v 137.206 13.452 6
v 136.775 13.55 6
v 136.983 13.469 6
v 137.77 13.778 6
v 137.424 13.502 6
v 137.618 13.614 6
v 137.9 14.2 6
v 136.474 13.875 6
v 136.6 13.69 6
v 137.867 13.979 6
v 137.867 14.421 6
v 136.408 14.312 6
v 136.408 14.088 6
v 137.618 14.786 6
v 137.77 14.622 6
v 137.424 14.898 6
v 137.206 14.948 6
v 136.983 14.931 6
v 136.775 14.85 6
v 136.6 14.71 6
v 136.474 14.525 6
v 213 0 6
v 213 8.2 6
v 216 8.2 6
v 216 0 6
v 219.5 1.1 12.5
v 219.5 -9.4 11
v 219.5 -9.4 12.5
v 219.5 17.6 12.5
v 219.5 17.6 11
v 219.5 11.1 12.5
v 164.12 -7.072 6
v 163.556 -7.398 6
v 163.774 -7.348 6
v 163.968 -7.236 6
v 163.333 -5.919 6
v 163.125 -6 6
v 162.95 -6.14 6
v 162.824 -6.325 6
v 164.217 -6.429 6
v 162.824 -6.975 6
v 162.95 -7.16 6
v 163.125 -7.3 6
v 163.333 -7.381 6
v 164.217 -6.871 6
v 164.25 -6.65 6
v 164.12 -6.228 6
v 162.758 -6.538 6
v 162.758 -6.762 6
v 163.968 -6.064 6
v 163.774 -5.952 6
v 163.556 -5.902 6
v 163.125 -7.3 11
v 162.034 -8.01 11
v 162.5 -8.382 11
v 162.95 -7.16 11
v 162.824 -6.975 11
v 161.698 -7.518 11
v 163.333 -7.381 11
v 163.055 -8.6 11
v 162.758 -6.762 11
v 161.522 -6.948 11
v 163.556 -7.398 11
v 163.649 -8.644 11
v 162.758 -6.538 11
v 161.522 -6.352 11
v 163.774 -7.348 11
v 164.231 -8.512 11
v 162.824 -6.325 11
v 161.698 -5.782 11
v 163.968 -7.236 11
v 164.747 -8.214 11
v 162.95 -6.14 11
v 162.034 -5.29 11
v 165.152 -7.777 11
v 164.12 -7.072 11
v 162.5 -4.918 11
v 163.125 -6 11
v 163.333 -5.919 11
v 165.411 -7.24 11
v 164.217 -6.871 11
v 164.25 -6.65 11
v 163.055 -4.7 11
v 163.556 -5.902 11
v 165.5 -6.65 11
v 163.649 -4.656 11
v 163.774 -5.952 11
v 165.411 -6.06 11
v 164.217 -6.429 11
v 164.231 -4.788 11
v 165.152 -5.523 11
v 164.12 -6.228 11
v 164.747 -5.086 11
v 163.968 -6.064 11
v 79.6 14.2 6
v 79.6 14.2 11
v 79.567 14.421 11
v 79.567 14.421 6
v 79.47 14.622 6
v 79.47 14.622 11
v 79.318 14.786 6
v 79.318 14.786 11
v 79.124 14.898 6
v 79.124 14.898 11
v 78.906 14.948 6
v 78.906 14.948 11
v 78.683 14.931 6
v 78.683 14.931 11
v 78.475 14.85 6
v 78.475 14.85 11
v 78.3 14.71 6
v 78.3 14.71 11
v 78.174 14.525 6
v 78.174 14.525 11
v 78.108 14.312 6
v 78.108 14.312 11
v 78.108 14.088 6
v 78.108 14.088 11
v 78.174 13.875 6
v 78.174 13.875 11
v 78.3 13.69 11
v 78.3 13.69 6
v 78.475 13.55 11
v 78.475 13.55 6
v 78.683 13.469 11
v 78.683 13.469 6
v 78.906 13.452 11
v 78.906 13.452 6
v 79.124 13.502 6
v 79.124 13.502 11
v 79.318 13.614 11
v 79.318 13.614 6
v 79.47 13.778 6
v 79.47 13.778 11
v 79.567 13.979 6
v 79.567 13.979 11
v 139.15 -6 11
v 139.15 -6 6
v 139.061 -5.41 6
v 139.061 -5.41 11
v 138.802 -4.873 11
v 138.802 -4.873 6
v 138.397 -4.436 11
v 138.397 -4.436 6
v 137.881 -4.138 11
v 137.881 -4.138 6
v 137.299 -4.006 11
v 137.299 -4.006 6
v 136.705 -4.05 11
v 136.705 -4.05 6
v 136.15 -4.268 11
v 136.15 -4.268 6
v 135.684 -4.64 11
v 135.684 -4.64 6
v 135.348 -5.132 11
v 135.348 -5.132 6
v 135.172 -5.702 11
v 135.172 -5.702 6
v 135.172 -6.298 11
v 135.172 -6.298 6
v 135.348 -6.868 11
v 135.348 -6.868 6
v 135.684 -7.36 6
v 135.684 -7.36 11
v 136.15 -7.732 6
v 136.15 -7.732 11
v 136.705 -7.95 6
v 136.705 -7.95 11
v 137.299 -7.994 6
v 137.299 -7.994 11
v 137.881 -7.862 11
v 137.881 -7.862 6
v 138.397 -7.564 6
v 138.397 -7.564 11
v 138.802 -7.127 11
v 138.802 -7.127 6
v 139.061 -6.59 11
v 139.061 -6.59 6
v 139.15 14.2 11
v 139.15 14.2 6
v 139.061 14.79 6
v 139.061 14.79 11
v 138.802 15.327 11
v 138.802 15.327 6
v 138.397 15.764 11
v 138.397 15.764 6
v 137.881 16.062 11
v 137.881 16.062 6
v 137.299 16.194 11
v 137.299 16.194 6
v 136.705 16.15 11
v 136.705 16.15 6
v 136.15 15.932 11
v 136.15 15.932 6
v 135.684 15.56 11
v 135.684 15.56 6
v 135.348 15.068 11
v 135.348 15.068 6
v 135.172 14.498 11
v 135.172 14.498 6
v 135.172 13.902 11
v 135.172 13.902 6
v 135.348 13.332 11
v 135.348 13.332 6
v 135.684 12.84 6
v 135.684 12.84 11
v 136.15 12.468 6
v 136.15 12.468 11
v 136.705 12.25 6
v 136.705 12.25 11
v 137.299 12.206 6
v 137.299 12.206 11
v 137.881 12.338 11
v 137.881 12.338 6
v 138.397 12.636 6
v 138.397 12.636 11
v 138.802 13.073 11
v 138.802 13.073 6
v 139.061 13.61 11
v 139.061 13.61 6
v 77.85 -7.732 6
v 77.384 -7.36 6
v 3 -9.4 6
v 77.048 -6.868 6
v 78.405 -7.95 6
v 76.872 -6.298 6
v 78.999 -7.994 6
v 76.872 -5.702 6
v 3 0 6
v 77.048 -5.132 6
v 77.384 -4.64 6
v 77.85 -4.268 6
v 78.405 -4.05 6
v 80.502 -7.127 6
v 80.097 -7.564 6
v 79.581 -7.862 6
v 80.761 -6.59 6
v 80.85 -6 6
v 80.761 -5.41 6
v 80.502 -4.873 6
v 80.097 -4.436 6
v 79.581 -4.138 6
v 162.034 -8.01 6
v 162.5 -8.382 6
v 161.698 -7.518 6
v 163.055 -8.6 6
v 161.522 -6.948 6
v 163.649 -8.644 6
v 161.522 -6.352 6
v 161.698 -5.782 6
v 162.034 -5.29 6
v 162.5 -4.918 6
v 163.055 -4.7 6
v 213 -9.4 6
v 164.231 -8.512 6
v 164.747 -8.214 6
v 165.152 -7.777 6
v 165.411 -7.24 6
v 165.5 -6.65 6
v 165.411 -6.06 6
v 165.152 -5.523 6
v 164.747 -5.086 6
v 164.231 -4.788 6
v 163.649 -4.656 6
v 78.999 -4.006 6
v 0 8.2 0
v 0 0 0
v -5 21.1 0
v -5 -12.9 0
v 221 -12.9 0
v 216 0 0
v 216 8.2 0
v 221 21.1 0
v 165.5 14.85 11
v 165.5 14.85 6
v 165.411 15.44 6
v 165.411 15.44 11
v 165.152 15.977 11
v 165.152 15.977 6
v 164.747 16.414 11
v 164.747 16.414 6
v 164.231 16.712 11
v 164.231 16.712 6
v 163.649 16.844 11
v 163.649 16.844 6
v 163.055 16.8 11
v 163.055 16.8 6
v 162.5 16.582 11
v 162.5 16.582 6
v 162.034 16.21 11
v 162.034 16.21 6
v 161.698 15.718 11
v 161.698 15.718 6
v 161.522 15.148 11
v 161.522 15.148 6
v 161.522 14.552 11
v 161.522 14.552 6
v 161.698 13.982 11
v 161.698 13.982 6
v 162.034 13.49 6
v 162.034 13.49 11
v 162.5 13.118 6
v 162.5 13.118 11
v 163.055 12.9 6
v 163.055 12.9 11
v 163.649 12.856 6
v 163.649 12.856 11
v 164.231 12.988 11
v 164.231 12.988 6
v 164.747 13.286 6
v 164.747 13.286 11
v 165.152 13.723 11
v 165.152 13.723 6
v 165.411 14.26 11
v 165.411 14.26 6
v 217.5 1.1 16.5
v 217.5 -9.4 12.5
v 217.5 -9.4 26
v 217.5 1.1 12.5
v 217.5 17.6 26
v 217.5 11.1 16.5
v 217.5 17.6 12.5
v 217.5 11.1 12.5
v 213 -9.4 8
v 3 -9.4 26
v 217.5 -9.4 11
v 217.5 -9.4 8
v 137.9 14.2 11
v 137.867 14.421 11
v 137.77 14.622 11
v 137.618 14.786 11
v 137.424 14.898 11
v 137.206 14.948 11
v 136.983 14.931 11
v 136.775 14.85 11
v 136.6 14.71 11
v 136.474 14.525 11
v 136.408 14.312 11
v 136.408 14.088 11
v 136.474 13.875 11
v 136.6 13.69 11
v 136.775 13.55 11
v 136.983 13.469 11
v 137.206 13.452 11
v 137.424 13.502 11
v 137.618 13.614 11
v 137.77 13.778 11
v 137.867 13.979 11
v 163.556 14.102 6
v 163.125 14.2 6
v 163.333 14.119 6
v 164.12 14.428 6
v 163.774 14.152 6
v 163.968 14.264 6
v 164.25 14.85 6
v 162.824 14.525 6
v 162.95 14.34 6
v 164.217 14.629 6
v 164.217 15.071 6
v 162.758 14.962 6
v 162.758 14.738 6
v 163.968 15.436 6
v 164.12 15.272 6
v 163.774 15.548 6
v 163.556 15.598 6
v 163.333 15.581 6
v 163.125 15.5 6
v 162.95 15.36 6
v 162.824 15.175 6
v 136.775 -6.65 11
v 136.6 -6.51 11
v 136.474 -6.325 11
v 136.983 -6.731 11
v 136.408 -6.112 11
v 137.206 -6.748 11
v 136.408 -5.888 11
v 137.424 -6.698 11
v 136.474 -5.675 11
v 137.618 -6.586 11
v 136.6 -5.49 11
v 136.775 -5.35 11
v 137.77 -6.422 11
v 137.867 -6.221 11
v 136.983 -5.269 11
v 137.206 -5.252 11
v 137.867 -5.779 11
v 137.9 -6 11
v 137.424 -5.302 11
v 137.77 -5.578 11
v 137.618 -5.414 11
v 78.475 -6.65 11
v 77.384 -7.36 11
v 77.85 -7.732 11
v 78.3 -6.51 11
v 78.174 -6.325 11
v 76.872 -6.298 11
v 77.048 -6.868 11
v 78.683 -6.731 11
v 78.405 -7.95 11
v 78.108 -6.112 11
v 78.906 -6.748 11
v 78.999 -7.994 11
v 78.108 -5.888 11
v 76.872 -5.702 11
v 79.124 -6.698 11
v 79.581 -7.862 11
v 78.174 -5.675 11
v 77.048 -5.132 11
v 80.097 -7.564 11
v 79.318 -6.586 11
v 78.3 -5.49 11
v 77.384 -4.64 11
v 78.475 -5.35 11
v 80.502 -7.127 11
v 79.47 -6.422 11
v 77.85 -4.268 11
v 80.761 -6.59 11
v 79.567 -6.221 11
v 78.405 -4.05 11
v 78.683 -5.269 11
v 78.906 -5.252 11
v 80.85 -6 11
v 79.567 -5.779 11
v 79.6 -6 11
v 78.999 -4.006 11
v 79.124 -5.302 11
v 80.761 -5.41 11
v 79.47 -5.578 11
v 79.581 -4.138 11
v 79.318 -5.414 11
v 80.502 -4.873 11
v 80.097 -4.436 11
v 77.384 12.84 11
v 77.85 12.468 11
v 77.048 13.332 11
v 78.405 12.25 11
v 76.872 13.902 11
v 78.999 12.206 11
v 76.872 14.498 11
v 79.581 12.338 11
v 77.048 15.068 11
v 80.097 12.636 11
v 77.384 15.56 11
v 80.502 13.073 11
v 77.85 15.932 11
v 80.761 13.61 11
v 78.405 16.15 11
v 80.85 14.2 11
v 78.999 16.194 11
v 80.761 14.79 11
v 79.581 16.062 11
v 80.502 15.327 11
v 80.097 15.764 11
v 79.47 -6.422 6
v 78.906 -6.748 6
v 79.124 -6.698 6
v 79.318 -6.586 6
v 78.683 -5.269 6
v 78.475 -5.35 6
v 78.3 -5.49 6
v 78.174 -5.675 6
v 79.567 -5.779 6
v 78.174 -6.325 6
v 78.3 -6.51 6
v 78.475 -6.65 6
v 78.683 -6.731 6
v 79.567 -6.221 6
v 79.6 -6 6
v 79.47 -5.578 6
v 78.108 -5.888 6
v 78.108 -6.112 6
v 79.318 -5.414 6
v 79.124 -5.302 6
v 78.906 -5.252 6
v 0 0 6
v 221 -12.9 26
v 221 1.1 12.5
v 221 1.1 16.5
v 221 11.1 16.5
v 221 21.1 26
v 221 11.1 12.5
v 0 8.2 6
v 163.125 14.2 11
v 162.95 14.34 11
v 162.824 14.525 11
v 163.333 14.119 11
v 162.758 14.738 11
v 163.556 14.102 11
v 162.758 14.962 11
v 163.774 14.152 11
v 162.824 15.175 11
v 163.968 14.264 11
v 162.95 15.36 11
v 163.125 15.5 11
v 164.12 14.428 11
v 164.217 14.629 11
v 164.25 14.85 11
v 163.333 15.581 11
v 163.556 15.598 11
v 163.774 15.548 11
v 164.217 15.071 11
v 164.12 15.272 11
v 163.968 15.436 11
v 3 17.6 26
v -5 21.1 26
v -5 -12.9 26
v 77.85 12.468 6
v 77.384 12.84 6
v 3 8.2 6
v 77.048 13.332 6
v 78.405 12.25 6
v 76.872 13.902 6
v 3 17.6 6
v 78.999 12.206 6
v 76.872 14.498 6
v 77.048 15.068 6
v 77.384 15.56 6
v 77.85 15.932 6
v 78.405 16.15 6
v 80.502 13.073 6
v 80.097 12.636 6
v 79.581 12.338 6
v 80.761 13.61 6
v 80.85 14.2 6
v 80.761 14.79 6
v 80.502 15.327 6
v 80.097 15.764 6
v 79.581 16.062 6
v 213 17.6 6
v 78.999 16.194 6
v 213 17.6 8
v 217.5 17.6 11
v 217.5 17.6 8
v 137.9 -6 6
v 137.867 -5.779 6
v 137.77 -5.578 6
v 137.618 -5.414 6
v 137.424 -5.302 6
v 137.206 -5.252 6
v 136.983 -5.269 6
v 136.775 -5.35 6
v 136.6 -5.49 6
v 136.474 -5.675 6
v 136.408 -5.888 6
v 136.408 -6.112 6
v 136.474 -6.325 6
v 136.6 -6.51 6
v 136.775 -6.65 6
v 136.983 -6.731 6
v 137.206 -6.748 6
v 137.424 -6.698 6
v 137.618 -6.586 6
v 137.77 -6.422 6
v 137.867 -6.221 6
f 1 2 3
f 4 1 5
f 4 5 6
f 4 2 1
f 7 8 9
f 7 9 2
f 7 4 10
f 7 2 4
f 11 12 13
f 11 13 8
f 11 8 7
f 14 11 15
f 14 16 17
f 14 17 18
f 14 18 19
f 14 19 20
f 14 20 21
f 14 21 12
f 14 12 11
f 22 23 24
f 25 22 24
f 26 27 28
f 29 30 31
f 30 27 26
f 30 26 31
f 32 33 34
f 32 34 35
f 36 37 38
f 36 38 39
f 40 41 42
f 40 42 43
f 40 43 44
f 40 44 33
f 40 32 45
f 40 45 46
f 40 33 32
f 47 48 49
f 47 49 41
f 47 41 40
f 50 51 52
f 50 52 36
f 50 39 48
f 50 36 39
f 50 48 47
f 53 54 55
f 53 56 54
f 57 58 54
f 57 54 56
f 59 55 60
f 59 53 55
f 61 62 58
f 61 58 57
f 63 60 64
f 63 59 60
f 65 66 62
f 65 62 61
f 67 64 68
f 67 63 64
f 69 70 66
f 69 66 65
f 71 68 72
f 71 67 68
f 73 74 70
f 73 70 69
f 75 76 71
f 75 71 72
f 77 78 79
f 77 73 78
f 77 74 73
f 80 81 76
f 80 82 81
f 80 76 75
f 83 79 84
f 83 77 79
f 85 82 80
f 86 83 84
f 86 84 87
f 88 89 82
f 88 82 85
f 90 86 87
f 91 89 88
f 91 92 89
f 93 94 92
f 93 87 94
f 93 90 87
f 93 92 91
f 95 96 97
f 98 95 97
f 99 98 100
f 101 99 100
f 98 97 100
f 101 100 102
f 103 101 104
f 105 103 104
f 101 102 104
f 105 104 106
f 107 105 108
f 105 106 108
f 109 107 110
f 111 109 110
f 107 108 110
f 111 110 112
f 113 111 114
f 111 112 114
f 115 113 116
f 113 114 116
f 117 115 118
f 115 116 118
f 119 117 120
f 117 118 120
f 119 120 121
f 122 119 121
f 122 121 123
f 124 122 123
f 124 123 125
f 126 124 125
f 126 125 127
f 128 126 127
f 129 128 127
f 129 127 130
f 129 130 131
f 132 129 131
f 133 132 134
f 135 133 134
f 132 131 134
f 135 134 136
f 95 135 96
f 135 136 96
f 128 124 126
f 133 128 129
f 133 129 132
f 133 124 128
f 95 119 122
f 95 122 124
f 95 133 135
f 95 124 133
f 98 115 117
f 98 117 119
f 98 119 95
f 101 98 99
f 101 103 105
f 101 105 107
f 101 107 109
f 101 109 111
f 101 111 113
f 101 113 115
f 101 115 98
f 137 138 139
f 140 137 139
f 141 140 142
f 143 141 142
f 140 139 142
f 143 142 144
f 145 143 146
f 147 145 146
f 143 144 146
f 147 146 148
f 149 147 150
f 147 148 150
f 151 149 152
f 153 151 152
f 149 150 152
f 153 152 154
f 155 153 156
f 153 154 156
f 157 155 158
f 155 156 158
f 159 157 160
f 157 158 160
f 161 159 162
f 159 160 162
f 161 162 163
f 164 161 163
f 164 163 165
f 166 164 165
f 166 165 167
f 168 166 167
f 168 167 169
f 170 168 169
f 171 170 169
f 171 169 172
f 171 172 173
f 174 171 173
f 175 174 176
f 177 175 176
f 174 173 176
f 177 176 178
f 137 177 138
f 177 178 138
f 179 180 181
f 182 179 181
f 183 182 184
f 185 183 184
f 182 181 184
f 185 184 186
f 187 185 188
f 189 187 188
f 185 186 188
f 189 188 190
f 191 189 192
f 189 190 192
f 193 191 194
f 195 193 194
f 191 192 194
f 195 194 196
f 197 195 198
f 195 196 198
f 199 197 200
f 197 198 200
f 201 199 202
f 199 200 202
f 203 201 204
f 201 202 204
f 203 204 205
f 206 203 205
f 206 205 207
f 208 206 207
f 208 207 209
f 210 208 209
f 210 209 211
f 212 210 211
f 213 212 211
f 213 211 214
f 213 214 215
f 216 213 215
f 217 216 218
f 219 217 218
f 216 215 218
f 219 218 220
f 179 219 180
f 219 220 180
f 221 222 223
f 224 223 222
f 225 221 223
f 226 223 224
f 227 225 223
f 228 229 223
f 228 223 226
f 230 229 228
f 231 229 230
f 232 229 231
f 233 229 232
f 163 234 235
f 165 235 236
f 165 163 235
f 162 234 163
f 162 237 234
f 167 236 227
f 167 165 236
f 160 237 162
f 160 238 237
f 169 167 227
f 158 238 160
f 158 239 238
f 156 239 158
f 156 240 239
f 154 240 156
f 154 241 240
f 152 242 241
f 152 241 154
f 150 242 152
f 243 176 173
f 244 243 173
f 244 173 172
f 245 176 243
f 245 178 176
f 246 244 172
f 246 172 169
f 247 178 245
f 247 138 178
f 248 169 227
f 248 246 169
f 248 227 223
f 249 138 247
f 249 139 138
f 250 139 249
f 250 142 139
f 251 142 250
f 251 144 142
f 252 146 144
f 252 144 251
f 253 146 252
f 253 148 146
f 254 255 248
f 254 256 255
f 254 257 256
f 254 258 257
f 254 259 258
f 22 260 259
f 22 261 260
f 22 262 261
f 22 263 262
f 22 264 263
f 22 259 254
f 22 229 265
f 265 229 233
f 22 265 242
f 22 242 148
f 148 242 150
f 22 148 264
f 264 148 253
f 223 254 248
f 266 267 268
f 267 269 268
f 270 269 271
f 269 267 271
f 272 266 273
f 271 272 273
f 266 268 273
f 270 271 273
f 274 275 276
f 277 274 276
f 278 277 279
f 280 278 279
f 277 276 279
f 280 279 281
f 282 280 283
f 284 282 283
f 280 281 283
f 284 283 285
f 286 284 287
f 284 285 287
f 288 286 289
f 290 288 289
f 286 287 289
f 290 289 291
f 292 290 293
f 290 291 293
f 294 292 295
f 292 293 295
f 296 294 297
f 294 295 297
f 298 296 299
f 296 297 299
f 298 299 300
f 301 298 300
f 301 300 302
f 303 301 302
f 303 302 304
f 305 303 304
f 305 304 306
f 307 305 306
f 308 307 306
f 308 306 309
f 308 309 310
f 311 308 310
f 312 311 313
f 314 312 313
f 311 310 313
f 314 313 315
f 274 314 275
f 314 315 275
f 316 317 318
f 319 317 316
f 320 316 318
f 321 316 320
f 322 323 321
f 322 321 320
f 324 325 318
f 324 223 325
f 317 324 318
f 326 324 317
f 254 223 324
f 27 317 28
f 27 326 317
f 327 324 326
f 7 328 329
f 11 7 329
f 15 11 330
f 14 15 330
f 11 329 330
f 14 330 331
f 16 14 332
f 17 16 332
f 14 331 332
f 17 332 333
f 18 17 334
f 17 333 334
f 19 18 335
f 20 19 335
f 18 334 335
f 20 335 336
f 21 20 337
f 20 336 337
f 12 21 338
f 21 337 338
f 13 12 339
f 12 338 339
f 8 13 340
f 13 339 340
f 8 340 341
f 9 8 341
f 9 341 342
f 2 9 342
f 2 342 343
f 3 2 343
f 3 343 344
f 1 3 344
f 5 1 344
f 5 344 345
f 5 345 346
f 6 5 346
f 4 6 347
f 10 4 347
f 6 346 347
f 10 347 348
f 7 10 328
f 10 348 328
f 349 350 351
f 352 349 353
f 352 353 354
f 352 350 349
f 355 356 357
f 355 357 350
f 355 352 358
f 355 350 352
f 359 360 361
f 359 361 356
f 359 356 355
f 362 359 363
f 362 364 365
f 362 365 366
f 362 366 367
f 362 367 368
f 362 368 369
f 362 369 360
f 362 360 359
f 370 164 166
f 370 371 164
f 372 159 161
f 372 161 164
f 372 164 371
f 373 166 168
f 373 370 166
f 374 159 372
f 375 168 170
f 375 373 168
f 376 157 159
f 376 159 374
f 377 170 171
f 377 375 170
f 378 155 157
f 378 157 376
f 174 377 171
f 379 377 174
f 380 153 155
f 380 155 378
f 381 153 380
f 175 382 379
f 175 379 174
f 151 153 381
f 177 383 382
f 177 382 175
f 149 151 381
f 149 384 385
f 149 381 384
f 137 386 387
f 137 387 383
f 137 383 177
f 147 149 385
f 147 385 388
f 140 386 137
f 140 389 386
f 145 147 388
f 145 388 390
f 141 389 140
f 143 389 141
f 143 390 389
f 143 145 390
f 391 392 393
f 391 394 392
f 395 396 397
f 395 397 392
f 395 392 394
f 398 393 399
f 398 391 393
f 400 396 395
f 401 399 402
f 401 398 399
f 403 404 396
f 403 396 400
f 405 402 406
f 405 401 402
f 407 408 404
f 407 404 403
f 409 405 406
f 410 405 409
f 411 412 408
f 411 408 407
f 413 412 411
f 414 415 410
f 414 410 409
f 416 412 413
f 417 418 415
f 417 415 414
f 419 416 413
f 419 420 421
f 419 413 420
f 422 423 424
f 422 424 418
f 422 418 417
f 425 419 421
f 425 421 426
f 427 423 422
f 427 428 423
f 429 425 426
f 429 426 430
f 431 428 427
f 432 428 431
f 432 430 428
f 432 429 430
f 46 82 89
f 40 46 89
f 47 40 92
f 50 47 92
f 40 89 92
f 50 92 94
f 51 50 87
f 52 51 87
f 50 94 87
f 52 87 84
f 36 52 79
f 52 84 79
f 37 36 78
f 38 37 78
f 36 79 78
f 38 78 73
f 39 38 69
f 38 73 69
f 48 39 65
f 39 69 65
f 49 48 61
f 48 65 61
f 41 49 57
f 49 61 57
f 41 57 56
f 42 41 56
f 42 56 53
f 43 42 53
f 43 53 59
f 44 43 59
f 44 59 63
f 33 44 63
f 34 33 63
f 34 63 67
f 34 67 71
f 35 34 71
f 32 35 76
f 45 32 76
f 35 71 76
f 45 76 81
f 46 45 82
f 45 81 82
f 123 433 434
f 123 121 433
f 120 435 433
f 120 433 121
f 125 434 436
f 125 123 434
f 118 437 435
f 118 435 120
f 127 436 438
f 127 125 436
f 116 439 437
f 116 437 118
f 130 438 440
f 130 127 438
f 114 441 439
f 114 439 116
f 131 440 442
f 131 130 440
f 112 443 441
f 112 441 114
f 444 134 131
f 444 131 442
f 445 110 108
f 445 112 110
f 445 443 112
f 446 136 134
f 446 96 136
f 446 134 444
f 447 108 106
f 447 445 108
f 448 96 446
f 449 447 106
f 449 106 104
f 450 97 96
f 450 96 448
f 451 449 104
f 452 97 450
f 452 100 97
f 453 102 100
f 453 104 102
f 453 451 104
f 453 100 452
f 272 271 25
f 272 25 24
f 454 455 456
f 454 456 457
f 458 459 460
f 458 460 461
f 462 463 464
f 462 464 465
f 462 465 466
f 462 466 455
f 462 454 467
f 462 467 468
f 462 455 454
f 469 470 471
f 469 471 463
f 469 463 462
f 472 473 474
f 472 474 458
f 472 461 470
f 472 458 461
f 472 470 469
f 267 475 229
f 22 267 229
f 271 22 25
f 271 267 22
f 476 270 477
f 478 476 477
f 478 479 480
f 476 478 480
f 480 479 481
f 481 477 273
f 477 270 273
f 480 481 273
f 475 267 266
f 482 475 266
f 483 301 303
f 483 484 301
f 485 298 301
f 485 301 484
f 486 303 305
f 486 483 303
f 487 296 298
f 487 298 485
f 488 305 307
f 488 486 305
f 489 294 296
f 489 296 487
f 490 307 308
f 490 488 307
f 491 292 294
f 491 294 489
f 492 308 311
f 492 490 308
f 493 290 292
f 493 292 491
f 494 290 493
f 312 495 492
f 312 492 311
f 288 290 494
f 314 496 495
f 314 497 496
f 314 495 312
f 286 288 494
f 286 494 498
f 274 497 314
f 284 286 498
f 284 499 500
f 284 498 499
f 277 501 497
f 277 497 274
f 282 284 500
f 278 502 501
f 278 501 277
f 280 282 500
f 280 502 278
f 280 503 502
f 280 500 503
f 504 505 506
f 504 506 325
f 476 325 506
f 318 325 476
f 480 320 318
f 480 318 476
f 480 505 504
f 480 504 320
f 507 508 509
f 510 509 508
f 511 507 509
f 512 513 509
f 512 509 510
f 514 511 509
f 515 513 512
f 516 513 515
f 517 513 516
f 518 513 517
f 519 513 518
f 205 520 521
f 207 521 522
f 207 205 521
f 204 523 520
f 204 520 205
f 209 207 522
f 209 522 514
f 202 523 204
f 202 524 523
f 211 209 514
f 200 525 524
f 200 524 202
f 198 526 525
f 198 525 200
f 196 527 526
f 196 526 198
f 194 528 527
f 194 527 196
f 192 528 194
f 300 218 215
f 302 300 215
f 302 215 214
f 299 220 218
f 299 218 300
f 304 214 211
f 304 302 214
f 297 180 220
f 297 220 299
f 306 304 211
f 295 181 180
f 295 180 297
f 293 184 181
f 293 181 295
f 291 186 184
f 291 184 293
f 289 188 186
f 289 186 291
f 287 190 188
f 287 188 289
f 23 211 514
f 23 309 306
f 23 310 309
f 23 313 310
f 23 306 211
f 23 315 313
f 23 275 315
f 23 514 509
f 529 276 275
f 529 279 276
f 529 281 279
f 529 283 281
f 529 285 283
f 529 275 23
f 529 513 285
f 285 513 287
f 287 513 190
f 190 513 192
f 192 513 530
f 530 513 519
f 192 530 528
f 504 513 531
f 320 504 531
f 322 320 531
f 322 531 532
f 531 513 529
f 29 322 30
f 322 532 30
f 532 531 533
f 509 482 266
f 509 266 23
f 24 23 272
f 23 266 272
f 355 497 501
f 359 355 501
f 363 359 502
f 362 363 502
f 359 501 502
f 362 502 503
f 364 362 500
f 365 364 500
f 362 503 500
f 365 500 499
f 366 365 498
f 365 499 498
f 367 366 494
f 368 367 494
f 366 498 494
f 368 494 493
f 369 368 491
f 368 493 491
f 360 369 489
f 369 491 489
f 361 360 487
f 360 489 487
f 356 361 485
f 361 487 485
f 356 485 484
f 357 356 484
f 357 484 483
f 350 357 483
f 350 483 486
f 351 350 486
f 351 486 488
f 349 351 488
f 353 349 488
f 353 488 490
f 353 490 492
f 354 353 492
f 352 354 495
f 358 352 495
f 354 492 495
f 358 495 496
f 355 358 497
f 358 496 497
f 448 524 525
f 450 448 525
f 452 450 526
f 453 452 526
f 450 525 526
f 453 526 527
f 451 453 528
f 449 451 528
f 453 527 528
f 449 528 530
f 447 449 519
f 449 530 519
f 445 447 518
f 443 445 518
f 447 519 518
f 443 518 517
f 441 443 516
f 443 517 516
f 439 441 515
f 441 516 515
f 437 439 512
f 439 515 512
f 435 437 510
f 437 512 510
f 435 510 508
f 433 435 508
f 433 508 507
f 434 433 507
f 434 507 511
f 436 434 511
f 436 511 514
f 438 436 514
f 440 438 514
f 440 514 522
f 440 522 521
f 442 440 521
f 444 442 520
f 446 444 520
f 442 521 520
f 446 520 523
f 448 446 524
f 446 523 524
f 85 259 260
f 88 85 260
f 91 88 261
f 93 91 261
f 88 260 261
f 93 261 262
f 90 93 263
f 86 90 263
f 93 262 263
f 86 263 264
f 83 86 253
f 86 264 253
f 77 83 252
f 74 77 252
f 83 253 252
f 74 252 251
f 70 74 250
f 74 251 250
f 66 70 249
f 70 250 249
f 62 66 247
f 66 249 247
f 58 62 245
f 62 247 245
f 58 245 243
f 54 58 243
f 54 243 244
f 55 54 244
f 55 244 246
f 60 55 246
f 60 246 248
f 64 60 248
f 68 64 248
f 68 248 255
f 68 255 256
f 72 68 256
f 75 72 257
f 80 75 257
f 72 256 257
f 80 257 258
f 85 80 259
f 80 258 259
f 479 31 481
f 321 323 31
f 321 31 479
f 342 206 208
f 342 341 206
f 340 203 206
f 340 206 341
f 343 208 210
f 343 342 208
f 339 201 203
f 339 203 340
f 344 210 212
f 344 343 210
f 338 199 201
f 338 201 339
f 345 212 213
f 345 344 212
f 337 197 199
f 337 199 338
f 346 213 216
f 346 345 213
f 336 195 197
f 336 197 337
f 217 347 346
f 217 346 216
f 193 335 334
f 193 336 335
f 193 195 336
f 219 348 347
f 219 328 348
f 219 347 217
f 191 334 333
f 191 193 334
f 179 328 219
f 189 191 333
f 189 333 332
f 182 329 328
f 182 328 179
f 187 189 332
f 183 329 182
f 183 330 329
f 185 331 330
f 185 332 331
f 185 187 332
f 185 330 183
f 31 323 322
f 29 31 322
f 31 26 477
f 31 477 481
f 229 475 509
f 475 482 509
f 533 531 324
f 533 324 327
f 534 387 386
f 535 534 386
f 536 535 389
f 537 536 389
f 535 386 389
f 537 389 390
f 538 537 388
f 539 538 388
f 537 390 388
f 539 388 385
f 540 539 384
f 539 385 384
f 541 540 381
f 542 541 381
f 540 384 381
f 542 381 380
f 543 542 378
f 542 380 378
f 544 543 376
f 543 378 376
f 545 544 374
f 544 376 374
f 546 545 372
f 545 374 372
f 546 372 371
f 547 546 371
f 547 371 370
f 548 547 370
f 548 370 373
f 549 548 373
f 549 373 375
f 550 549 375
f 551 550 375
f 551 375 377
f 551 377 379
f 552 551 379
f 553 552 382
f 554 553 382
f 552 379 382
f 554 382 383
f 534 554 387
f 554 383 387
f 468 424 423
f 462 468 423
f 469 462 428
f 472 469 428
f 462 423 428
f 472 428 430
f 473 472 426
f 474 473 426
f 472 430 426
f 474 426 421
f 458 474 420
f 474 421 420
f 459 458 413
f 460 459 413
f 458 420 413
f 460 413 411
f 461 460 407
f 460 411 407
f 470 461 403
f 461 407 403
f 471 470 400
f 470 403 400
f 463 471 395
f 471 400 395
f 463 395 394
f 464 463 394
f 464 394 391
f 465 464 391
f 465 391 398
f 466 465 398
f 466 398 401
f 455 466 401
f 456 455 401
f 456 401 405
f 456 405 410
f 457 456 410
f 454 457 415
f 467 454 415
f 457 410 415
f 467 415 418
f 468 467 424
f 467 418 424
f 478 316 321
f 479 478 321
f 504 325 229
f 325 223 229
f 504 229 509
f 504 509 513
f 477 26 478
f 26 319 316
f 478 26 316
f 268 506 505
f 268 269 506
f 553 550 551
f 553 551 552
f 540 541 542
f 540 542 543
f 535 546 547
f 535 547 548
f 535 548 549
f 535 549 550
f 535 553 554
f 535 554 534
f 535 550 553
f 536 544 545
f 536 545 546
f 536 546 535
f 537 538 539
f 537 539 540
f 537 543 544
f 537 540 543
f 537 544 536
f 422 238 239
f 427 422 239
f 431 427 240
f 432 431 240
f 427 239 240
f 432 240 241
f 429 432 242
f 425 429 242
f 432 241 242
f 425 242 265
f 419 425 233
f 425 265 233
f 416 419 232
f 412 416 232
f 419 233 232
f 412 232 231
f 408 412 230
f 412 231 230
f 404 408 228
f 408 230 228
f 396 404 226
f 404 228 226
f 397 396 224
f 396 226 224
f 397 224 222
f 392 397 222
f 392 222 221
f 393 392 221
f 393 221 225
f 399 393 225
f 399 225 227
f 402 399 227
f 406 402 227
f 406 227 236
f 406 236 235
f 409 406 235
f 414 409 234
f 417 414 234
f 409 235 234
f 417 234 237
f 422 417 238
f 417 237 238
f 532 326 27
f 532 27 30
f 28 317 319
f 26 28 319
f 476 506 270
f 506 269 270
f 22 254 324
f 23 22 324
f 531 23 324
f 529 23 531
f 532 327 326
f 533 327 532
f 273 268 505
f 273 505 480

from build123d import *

# Parameters (mm, degrees)
SKETCH_1_W          = 226
SKETCH_1_H          = 34
SKETCH_1_W_2        = 216
SKETCH_1_H_2        = 8.2
EXTRUDE_1_DEPTH     = 6
SKETCH_2_R          = 2
EXTRUDE_2_DEPTH     = 5
SKETCH_3_R          = 0.75
CUT_EXTRUDE_1_DEPTH = 5
SKETCH_4_W          = 226
SKETCH_4_H          = 34
SKETCH_4_W_2        = 210
SKETCH_4_H_2        = 27
EXTRUDE_3_DEPTH     = 2
SKETCH_6_W          = 226
SKETCH_6_H          = 34
SKETCH_6_W_2        = 214.5
SKETCH_6_H_2        = 27
EXTRUDE_4_DEPTH     = 18
SKETCH_7_W          = 1.5
SKETCH_7_H          = 27
CUT_EXTRUDE_2_DEPTH = 2
SKETCH_8_R          = 2
EXTRUDE_5_DEPTH     = 5
SKETCH_9_R          = 0.75
CUT_EXTRUDE_3_DEPTH = 5
SKETCH_10_W         = 4
SKETCH_10_H         = 10
CUT_EXTRUDE_4_DEPTH = 5


with BuildPart() as part:
    # Эскиз1 → Бобышка-Вытянуть1 (new body)
    with BuildSketch(Plane.XY):
        with Locations((108, 4.1)):
            Rectangle(SKETCH_1_W, SKETCH_1_H)
        with Locations((108, 4.1)):
            Rectangle(SKETCH_1_W_2, SKETCH_1_H_2, mode=Mode.SUBTRACT)
    extrude(amount=EXTRUDE_1_DEPTH)

    # Эскиз2 → Бобышка-Вытянуть2 (add)
    with BuildSketch(Plane.XY.offset(6)):
        with Locations((78.85, 14.2)):
            Circle(SKETCH_2_R)
        with Locations((78.85, -6)):
            Circle(SKETCH_2_R)
        with Locations((137.15, 14.2)):
            Circle(SKETCH_2_R)
        with Locations((137.15, -6)):
            Circle(SKETCH_2_R)
    extrude(amount=EXTRUDE_2_DEPTH)

    # Эскиз3 → Вырез-Вытянуть1 (cut)
    with BuildSketch(Plane.XY.offset(11)):
        with Locations((78.85, 14.2)):
            Circle(SKETCH_3_R)
        with Locations((78.85, -6)):
            Circle(SKETCH_3_R)
        with Locations((137.15, 14.2)):
            Circle(SKETCH_3_R)
        with Locations((137.15, -6)):
            Circle(SKETCH_3_R)
    extrude(amount=-CUT_EXTRUDE_1_DEPTH, mode=Mode.SUBTRACT)

    # Эскиз4 → Бобышка-Вытянуть3 (add)
    with BuildSketch(Plane.XY.offset(6)):
        with Locations((108, 4.1)):
            Rectangle(SKETCH_4_W, SKETCH_4_H)
        with Locations((108, 4.1)):
            Rectangle(SKETCH_4_W_2, SKETCH_4_H_2, mode=Mode.SUBTRACT)
    extrude(amount=EXTRUDE_3_DEPTH)

    # Эскиз6 → Бобышка-Вытянуть4 (add)
    with BuildSketch(Plane.XY.offset(8)):
        with Locations((108, 4.1)):
            Rectangle(SKETCH_6_W, SKETCH_6_H)
        with Locations((110.25, 4.1)):
            Rectangle(SKETCH_6_W_2, SKETCH_6_H_2, mode=Mode.SUBTRACT)
    extrude(amount=EXTRUDE_4_DEPTH)

    # Эскиз7 → Вырез-Вытянуть2 (cut)
    with BuildSketch(Plane.ZY.offset(-217.5)):
        with Locations((11.75, 4.1)):
            Rectangle(SKETCH_7_W, SKETCH_7_H)
    extrude(amount=-CUT_EXTRUDE_2_DEPTH, mode=Mode.SUBTRACT)

    # Эскиз8 → Бобышка-Вытянуть5 (add)
    with BuildSketch(Plane.XY.offset(6)):
        with Locations((163.5, 14.85)):
            Circle(SKETCH_8_R)
        with Locations((163.5, -6.65)):
            Circle(SKETCH_8_R)
    extrude(amount=EXTRUDE_5_DEPTH)

    # Эскиз9 → Вырез-Вытянуть3 (cut)
    with BuildSketch(Plane.XY.offset(11)):
        with Locations((163.5, 14.85)):
            Circle(SKETCH_9_R)
        with Locations((163.5, -6.65)):
            Circle(SKETCH_9_R)
    extrude(amount=-CUT_EXTRUDE_3_DEPTH, mode=Mode.SUBTRACT)

    # Эскиз10 → Вырез-Вытянуть4 (cut)
    with BuildSketch(Plane.ZY.offset(-217.5)):
        with Locations((14.5, 6.1)):
            Rectangle(SKETCH_10_W, SKETCH_10_H)
    extrude(amount=-CUT_EXTRUDE_4_DEPTH, mode=Mode.SUBTRACT)


solid = part.part
